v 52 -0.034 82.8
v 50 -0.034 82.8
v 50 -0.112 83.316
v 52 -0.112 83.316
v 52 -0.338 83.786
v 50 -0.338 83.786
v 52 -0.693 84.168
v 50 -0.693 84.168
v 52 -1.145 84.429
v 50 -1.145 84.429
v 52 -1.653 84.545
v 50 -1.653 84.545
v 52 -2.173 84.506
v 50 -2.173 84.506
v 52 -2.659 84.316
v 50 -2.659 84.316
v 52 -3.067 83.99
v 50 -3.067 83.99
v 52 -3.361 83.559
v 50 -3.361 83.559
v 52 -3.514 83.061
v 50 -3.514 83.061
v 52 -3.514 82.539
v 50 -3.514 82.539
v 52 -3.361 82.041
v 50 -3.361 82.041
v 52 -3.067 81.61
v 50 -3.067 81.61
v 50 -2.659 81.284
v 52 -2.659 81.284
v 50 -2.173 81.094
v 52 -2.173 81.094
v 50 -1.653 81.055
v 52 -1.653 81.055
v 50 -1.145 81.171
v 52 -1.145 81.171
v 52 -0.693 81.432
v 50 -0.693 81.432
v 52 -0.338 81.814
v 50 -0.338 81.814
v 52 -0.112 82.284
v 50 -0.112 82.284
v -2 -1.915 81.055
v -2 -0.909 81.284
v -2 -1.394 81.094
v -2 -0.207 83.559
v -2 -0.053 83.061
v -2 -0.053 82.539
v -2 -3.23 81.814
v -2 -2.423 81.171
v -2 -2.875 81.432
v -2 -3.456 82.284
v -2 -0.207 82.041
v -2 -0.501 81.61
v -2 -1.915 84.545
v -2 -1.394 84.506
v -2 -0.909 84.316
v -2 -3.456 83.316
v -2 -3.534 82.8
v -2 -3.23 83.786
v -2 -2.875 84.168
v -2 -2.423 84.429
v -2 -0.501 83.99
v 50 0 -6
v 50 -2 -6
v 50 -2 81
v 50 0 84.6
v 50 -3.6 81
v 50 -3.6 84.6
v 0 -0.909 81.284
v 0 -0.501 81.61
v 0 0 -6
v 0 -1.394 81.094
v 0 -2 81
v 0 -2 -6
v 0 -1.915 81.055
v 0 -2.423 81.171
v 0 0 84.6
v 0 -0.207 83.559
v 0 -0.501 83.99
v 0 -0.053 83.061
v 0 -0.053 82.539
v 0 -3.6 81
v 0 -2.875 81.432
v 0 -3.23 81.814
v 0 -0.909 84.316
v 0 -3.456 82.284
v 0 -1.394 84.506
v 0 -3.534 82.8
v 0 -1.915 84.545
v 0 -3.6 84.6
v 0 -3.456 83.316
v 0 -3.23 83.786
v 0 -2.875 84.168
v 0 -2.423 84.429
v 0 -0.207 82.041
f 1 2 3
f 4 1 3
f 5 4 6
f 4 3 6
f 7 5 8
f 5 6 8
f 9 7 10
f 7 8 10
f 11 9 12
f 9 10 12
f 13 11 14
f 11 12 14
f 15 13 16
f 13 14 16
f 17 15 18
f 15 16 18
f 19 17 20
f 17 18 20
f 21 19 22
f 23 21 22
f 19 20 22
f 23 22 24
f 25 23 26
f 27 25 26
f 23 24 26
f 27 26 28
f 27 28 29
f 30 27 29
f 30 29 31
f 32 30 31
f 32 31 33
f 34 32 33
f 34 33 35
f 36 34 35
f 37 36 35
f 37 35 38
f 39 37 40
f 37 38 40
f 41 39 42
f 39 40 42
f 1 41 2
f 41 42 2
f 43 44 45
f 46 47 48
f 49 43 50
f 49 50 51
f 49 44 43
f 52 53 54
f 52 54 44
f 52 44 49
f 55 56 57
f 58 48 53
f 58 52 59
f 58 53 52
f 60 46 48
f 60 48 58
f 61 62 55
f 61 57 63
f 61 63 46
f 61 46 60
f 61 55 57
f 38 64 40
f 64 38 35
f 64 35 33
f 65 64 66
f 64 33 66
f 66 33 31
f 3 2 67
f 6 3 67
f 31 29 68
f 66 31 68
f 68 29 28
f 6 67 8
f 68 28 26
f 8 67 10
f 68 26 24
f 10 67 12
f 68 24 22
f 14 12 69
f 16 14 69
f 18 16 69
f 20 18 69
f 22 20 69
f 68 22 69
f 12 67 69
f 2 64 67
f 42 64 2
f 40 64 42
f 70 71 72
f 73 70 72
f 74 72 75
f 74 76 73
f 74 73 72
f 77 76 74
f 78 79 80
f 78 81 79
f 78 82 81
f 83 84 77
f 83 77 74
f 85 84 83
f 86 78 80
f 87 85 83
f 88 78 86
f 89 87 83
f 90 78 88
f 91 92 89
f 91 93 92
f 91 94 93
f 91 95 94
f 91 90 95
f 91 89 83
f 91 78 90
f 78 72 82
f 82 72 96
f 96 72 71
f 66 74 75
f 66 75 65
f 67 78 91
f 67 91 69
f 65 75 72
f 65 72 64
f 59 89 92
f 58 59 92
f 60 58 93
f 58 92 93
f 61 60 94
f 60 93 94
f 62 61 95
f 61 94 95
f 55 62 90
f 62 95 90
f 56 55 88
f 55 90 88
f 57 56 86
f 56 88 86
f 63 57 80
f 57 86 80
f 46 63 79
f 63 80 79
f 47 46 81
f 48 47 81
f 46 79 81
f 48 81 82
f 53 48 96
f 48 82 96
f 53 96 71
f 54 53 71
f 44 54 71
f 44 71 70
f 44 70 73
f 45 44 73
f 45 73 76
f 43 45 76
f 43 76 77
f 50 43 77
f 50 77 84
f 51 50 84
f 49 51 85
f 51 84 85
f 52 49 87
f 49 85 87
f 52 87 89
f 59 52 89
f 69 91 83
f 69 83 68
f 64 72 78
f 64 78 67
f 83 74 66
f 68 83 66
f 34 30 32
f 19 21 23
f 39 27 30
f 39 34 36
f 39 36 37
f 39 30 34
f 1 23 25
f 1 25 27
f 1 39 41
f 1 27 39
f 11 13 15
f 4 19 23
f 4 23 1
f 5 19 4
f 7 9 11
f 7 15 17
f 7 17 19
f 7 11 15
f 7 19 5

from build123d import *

# Parameters (mm, degrees)
F0_W      = 50
F0_H      = 81
F1_DEPTH  = 2
F0_H_2    = 3.6
F2_DEPTH  = 3.6
F4_R      = 1.75
F5_DEPTH  = 2
F3_R      = 1.75
F6_DEPTH  = 2
F1_FACE_W = 50
F1_FACE_H = 2
F7_DEPTH  = 6


with BuildPart() as f1:
    # F0 (on Front) → F1 (new body)
    with BuildSketch(Plane.XZ):
        with Locations((25, 40.5)):
            Rectangle(F0_W, F0_H)
    extrude(amount=F1_DEPTH)

    # F0 (on Front) → F2 (join)
    with BuildSketch(Plane.XZ):
        with Locations((25, 82.8)):
            Rectangle(F0_W, F0_H_2)
    extrude(amount=F2_DEPTH)

    # F4 (on face) → F5 (join)
    with BuildSketch(Plane(origin=(0, 0, 0), x_dir=(0, -1, 0), z_dir=(-1, 0, 0))):
        with Locations((1.783865, 82.8)):
            Circle(F4_R)
    extrude(amount=F5_DEPTH)

    # F3 (on face) → F6 (join)
    with BuildSketch(Plane.YZ.offset(50)):
        with Locations((-1.783865, 82.8)):
            Circle(F3_R)
    extrude(amount=F6_DEPTH)

    # F1_face (on face) → F7 (join)
    with BuildSketch(Plane(origin=(25, -1, 0), x_dir=(1, 0, 0), z_dir=(0, 0, -1))):
        Rectangle(F1_FACE_W, F1_FACE_H)
    extrude(amount=F7_DEPTH)


solid = f1.part
